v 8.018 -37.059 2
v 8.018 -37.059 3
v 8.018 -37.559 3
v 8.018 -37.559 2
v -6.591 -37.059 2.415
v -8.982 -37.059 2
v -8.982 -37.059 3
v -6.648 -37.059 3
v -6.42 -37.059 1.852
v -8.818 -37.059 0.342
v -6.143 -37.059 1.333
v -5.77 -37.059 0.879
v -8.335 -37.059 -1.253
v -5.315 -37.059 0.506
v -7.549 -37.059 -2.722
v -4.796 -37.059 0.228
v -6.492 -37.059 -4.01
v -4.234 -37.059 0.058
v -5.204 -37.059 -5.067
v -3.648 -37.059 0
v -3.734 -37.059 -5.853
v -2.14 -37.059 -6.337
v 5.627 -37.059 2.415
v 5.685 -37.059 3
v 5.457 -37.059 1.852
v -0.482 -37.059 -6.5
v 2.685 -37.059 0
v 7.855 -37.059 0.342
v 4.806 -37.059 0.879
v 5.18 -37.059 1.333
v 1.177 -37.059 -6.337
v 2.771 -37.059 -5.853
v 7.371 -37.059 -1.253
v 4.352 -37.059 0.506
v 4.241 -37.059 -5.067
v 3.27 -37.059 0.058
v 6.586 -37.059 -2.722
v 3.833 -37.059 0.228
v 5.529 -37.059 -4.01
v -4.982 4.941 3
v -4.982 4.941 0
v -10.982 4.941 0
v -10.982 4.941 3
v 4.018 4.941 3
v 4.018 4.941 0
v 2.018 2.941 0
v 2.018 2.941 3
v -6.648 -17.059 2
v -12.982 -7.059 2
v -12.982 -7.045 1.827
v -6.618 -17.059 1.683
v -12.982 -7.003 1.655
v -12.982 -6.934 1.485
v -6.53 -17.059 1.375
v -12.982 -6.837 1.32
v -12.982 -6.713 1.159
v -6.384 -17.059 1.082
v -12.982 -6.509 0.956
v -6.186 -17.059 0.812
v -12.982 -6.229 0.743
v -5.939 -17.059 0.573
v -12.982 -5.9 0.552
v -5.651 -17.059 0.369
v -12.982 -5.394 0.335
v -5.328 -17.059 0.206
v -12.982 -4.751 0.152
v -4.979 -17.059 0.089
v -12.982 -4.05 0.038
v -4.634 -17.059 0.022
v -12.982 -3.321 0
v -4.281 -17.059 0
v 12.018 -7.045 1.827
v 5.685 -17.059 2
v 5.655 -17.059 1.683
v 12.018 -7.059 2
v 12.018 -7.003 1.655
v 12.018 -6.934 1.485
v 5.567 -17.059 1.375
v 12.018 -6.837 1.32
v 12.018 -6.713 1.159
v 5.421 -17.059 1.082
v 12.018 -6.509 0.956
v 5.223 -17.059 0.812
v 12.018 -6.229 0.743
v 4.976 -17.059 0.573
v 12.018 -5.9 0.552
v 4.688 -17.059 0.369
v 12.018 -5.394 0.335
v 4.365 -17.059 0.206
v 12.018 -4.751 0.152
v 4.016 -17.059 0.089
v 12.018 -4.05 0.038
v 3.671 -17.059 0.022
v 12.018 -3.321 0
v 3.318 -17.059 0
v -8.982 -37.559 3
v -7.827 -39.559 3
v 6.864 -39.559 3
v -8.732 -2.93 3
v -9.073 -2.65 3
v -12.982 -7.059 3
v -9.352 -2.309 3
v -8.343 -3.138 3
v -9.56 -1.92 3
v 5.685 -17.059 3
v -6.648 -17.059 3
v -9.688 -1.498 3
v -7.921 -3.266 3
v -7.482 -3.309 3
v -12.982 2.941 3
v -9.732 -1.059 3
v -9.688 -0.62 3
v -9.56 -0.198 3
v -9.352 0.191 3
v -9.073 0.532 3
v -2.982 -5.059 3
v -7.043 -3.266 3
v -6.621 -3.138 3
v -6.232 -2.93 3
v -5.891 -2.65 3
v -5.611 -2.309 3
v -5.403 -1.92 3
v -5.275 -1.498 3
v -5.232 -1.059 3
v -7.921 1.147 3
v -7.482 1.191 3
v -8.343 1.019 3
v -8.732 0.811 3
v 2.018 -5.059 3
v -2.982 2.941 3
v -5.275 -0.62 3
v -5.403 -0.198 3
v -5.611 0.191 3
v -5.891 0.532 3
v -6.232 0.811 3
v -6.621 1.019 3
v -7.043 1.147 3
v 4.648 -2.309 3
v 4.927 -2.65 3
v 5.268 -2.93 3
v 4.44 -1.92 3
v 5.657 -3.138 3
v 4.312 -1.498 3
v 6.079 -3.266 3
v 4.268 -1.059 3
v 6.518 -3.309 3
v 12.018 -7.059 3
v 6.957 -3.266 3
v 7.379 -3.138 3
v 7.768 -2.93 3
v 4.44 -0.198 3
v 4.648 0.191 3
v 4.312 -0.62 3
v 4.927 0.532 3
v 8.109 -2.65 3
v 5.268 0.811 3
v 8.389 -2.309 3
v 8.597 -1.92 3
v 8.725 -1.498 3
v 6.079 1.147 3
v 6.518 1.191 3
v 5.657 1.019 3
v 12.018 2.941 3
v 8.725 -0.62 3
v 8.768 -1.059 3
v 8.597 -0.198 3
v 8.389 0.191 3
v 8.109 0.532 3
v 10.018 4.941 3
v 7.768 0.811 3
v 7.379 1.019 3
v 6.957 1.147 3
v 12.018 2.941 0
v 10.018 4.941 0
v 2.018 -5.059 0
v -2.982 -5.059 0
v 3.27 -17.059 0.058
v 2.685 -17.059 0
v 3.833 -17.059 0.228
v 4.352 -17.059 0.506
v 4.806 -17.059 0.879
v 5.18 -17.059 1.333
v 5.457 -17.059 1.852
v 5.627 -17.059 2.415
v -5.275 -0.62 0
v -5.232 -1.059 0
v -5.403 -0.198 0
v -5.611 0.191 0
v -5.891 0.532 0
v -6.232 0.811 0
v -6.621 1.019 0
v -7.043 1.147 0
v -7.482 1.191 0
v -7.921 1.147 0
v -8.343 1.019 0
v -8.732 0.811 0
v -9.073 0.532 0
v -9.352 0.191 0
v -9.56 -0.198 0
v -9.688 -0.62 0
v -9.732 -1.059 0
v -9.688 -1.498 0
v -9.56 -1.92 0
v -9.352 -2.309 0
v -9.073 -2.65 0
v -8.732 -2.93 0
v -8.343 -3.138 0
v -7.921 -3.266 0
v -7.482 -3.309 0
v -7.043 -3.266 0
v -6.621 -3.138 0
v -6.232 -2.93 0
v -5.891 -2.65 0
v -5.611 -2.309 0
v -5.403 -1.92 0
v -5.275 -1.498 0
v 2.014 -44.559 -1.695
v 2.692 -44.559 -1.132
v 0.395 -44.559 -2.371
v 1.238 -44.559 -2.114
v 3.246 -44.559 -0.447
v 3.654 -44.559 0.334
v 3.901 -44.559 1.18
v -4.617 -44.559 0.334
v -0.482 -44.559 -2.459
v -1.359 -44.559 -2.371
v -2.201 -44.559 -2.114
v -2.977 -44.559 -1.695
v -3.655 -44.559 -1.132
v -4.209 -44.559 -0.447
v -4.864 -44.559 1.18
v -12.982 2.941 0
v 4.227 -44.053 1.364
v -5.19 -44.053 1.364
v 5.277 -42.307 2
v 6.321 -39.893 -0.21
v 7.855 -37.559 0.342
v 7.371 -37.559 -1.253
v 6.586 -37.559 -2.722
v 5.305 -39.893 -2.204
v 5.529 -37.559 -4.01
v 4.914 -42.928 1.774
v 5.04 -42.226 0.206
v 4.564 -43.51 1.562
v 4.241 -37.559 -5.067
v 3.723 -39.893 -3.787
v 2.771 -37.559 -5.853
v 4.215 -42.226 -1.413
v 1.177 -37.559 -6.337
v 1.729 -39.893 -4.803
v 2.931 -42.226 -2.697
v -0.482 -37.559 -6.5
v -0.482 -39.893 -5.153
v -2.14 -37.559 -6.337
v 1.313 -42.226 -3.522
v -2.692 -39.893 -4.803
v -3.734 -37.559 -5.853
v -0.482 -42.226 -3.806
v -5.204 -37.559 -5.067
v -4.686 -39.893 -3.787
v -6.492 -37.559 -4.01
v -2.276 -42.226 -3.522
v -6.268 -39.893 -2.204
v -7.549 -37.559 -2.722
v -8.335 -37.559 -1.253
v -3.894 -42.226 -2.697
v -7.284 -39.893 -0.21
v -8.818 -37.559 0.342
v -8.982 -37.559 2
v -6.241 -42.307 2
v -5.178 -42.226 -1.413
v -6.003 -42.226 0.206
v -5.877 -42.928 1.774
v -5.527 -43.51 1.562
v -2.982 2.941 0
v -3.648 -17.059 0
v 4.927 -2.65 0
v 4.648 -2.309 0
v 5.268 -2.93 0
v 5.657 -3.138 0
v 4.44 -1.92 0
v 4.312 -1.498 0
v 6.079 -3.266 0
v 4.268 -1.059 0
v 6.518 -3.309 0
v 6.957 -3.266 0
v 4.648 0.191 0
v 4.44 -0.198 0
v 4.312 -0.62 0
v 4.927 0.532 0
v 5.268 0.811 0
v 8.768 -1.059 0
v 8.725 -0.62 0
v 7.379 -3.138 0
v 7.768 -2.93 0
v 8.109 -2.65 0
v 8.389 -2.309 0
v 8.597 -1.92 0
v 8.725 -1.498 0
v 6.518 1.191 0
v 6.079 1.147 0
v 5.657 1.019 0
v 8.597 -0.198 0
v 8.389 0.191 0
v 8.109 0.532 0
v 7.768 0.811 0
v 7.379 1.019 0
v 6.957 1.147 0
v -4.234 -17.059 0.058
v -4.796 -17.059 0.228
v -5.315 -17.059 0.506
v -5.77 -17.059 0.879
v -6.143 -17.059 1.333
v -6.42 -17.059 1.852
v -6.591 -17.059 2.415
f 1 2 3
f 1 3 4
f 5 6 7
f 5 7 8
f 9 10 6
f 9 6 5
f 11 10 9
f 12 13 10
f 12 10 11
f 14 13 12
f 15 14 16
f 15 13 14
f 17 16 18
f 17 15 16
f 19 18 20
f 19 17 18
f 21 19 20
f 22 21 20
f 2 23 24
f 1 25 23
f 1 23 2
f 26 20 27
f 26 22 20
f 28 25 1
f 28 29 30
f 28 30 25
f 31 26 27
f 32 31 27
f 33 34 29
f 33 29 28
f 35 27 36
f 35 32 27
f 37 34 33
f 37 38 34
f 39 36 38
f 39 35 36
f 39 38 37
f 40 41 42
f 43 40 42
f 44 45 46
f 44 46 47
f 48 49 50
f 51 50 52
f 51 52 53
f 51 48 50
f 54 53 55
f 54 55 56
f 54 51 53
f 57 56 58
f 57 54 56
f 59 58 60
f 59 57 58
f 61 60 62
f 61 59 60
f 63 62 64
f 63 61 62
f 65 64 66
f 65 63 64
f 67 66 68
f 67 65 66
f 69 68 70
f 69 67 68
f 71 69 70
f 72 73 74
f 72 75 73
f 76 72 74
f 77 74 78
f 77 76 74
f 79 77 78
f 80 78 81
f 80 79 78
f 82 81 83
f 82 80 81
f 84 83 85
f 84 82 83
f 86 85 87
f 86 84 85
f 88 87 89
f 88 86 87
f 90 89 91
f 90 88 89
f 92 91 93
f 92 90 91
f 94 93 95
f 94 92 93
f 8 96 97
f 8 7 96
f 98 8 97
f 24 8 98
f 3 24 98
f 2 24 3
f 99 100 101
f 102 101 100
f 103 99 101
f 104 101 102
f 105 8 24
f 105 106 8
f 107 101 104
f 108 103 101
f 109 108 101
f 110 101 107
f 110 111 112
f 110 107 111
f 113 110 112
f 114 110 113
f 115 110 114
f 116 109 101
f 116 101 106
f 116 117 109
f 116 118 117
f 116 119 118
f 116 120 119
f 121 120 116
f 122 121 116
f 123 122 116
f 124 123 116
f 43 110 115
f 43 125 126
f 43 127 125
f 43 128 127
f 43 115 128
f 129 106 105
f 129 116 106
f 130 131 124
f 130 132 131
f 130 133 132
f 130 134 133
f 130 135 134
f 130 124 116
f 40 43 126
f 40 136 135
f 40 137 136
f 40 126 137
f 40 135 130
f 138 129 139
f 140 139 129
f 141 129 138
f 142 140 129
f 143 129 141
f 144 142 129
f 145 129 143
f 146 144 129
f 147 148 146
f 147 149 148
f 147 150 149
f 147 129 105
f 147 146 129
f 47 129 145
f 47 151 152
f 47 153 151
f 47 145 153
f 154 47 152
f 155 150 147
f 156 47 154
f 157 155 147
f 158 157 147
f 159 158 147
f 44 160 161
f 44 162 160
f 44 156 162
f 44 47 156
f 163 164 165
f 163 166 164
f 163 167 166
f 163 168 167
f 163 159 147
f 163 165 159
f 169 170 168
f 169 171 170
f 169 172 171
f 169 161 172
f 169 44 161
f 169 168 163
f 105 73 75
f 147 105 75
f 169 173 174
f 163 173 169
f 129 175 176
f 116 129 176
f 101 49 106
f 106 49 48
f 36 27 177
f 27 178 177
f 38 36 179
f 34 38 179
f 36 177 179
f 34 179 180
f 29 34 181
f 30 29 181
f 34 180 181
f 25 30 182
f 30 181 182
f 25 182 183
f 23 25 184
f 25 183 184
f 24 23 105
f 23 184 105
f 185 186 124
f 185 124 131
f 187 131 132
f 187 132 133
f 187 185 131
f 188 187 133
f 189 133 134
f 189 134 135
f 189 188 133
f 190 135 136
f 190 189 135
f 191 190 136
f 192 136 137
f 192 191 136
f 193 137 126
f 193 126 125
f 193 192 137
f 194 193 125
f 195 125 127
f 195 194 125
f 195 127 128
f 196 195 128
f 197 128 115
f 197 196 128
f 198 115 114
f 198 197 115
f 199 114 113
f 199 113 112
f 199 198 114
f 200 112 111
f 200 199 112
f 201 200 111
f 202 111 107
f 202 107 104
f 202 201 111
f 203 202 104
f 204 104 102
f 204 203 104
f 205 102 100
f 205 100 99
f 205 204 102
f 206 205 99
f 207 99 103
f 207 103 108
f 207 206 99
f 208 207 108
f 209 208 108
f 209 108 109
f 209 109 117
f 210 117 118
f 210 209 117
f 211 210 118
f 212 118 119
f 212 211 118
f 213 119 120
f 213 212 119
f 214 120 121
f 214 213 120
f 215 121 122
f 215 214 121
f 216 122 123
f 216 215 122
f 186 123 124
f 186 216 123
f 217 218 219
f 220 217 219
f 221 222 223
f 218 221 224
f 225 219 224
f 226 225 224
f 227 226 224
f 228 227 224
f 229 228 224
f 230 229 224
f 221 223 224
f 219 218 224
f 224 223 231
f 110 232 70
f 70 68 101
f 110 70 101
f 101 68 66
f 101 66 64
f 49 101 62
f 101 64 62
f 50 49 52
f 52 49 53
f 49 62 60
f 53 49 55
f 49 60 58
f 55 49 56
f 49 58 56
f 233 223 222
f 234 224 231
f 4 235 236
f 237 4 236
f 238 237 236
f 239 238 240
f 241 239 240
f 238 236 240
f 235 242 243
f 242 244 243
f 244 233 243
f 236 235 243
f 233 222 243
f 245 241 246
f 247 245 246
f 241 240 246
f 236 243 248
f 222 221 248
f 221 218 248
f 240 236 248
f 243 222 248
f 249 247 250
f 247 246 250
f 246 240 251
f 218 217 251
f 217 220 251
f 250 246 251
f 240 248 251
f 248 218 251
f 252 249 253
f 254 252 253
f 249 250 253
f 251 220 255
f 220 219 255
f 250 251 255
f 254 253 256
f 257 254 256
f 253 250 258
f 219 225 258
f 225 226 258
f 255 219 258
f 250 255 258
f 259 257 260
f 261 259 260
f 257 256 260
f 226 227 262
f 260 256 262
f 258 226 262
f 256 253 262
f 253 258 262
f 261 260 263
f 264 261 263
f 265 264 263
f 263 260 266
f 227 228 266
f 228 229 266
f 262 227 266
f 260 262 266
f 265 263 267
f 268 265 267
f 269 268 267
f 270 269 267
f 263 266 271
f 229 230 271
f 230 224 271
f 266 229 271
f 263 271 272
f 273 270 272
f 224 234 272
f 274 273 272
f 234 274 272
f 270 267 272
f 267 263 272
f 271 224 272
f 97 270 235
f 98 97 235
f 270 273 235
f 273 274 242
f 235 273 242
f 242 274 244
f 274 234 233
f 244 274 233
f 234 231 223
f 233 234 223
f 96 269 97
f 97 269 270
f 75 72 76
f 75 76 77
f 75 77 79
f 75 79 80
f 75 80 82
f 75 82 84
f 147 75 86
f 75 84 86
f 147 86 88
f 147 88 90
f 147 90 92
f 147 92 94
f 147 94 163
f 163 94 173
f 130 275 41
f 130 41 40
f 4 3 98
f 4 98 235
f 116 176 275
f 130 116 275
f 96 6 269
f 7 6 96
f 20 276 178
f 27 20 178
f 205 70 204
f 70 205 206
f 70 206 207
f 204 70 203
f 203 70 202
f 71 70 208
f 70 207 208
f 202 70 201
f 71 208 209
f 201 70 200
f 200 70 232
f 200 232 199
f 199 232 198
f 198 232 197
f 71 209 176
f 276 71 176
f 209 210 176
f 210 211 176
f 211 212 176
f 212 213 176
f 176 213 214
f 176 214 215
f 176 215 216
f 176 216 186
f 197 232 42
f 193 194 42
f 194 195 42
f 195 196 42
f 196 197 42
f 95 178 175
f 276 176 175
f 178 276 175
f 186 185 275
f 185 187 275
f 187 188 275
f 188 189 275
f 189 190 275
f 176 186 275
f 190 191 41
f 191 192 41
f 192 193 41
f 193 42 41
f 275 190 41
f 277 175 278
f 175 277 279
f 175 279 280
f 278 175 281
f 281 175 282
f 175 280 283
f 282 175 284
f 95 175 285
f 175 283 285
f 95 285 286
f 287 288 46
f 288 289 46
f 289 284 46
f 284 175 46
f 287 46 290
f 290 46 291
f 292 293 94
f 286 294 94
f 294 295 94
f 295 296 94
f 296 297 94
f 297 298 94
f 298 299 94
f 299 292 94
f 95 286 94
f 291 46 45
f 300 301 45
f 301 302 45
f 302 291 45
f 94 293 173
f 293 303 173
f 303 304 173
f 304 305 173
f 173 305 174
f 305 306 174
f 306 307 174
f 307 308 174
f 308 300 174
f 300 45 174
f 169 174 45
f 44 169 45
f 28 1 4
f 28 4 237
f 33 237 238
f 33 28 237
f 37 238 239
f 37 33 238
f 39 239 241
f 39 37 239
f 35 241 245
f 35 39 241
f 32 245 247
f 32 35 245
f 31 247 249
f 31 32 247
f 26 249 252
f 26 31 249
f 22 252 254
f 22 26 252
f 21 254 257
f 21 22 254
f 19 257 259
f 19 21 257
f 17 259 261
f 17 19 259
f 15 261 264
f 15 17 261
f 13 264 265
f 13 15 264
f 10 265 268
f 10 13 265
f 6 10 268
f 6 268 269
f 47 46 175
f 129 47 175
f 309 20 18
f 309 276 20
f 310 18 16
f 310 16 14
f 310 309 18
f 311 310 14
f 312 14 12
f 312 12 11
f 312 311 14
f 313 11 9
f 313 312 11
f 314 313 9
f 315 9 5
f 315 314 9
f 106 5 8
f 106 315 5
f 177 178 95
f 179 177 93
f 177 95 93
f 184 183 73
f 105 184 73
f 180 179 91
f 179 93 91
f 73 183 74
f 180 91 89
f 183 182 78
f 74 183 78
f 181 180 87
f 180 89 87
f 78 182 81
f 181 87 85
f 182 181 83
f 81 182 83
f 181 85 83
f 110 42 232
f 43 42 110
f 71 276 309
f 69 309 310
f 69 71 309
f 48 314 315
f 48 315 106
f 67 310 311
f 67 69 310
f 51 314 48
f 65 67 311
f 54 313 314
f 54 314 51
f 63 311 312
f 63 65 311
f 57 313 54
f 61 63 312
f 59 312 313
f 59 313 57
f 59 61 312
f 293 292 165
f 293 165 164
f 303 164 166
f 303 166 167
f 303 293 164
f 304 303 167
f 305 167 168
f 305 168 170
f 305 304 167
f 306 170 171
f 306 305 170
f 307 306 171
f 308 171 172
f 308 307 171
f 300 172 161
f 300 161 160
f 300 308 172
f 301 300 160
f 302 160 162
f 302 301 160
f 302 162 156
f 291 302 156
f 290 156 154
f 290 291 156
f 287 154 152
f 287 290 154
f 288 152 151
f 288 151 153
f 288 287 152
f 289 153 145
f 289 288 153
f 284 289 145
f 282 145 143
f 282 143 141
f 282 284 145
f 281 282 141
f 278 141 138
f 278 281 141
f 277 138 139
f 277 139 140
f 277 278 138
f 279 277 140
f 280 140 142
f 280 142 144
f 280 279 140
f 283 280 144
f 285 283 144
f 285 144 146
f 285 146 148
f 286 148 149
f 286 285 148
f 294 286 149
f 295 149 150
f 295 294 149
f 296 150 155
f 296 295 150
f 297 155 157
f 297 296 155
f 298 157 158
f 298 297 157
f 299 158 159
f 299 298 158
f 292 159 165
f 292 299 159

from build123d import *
from OCP.BRepFilletAPI import BRepFilletAPI_MakeChamfer

# Parameters (mm, degrees)
SKETCH1_R           = 2.25
BOSS_EXTRUDE1_DEPTH = 3
BOSS_EXTRUDE2_DEPTH = 3
BOSS_EXTRUDE3_DEPTH = 7.5
CHAMFER1_SIZE       = 7
CHAMFER1_SIZE2      = 4.041451884
CUT_EXTRUDE1_DEPTH  = 47.864827652
FILLET1_R           = 3
CHAMFER2_SIZE       = 2
CHAMFER2_SIZE2      = 2.328114762
CHAMFER3_SIZE       = 5
CHAMFER3_SIZE2      = 1.819851171
CUT_EXTRUDE2_DEPTH  = 47.864827652
FILLET2_R           = 2


with BuildPart() as part:
    # Sketch1 → Boss-Extrude1 (new body)
    with BuildSketch(Plane.XY):
        Polygon((2.018448149, -5.059414071), (-2.981551851, -5.059414071), (-2.981551851, 4.940585929), (-12.981551851, 4.940585929), (-12.981551851, -7.059414071), (12.018448149, -7.059414071), (12.018448149, 4.940585929), (2.018448149, 4.940585929), align=None)
        with Locations((6.518448149, -1.059414071)):
            Circle(SKETCH1_R, mode=Mode.SUBTRACT)
        with Locations((-7.481551851, -1.059414071)):
            Circle(SKETCH1_R, mode=Mode.SUBTRACT)
    extrude(amount=BOSS_EXTRUDE1_DEPTH)

    # Sketch2 → Boss-Extrude2 (add, through all)
    with BuildSketch(Plane.XY.offset(3)):
        Polygon((-12.981551851, -7.059414071), (-8.981551851, -37.059414071), (8.018448149, -37.059414071), (12.018448149, -7.059414071), align=None)
    extrude(amount=-BOSS_EXTRUDE2_DEPTH)

    # Sketch4 → Boss-Extrude3 (add)
    with BuildSketch(Plane.XZ.offset(37.059414071)):
        with BuildLine():
            Line((-8.981551851, 2), (-8.981551851, 3))
            Line((-8.981551851, 3), (8.018448149, 3))
            Line((8.018448149, 3), (8.018448149, 2))
            ThreePointArc((8.018448149, 2), (-0.481551851, -6.5), (-8.981551851, 2))
        make_face()
    extrude(amount=BOSS_EXTRUDE3_DEPTH)

    # Chamfer1: one chamfer whose edges measure the first distance from different faces: ONE call of the kernel's chamfer builder (chamfer() names one face for all edges)
    chamfer1_edges_1 = [part.edges().sort_by_distance(p)[0] for p in [
        (-0.481551851, -44.559414071, -6.5),
    ]]
    chamfer1_side_1 = [part.faces().sort_by_distance(p)[0] for p in [
        (-0.481551851, -40.809414071, -6.5),
    ]]
    chamfer1_edges_2 = [part.edges().sort_by_distance(p)[0] for p in [
        (8.018448149, -44.559414071, 2.5),
    ]]
    chamfer1_side_2 = [part.faces().sort_by_distance(p)[0] for p in [
        (8.018448149, -40.809414071, 2.5),
    ]]
    chamfer1_edges_3 = [part.edges().sort_by_distance(p)[0] for p in [
        (-8.981551851, -44.559414071, 2.5),
    ]]
    chamfer1_side_3 = [part.faces().sort_by_distance(p)[0] for p in [
        (-8.981551851, -40.809414071, 2.5),
    ]]
    chamfer1 = BRepFilletAPI_MakeChamfer(part.part.solid().wrapped)
    for e in chamfer1_edges_1:
        chamfer1.Add(CHAMFER1_SIZE, CHAMFER1_SIZE2, e.wrapped, chamfer1_side_1[0].wrapped)  # the first distance lies on this face
    for e in chamfer1_edges_2:
        chamfer1.Add(CHAMFER1_SIZE, CHAMFER1_SIZE2, e.wrapped, chamfer1_side_2[0].wrapped)  # the first distance lies on this face
    for e in chamfer1_edges_3:
        chamfer1.Add(CHAMFER1_SIZE, CHAMFER1_SIZE2, e.wrapped, chamfer1_side_3[0].wrapped)  # the first distance lies on this face
    add(Compound.cast(chamfer1.Shape()), mode=Mode.REPLACE)

    # Sketch5 → Cut-Extrude1 (cut, through all)
    with BuildSketch(Plane(origin=(0, 0, 0), x_dir=(-1, 0, 0), z_dir=(0, 0, -1))):
        Polygon((6.648218517, -37.059414071), (6.648218517, -17.059414071), (11.648218517, -17.059414071), (8.981551851, -37.059414071), align=None)
        Polygon((-10.685114816, -17.059414071), (-8.018448149, -37.059414071), (-5.685114816, -37.059414071), (-5.685114816, -17.059414071), align=None)
    extrude(amount=-CUT_EXTRUDE1_DEPTH, mode=Mode.SUBTRACT)

    # Fillet1
    fillet1_edges = [part.edges().sort_by_distance(p)[0] for p in [
        (5.685114816, -27.059414071, 0),
        (-6.648218517, -27.059414071, 0),
    ]]
    fillet(fillet1_edges, radius=FILLET1_R - 0.0001)  # a hair under: the kernel refuses the full size

    # Chamfer2: one chamfer whose edges measure the first distance from different faces: ONE call of the kernel's chamfer builder (chamfer() names one face for all edges)
    chamfer2_edges_1 = [part.edges().sort_by_distance(p)[0] for p in [
        (2.018448149, 4.940585929, 1.5),
        (12.018448149, 4.940585929, 1.5),
        (-12.981551851, 4.940585929, 1.5),
        (-2.981551851, 4.940585929, 1.5),
    ]]
    chamfer2_edges_2 = [part.edges().sort_by_distance(p)[0] for p in [
        (-11.648218517, -17.059414071, 1.5),
    ]]
    chamfer2_side_2 = [part.faces().sort_by_distance(p)[0] for p in [
        (-12.314885184, -12.059414071, 1.5),
    ]]
    chamfer2_edges_3 = [part.edges().sort_by_distance(p)[0] for p in [
        (10.685114816, -17.059414071, 1.5),
    ]]
    chamfer2_side_3 = [part.faces().sort_by_distance(p)[0] for p in [
        (7.823515647, -17.059414071, 1.405334343),
    ]]
    chamfer2 = BRepFilletAPI_MakeChamfer(part.part.solid().wrapped)
    for e in chamfer2_edges_1:
        chamfer2.Add(CHAMFER2_SIZE, e.wrapped)
    for e in chamfer2_edges_2:
        chamfer2.Add(CHAMFER2_SIZE, CHAMFER2_SIZE2, e.wrapped, chamfer2_side_2[0].wrapped)  # the first distance lies on this face
    for e in chamfer2_edges_3:
        chamfer2.Add(CHAMFER2_SIZE, CHAMFER2_SIZE2, e.wrapped, chamfer2_side_3[0].wrapped)  # the first distance lies on this face
    add(Compound.cast(chamfer2.Shape()), mode=Mode.REPLACE)

    # Chamfer3
    chamfer3_edges = [part.edges().sort_by_distance(p)[0] for p in [
        (-0.481551851, -44.559414071, 3),
    ]]
    chamfer3_side = [part.faces().sort_by_distance(p)[0] for p in [
        (-0.481914427, -17.452973587, 3),
    ]]
    chamfer(chamfer3_edges, length=CHAMFER3_SIZE, length2=CHAMFER3_SIZE2, reference=chamfer3_side[0])

    # Sketch6 → Cut-Extrude2 (cut, through all)
    with BuildSketch(Plane(origin=(0, 0, 0), x_dir=(-1, 0, 0), z_dir=(0, 0, -1))):
        Polygon((-5.685114816, -17.059414071), (-12.018448149, -7.059414071), (-10.992807124, -14.751721764), (-8.685114816, -17.059414071), align=None)
        Polygon((12.981551851, -7.059414071), (6.648218517, -17.059414071), (9.320103756, -17.059414071), (11.912545957, -15.07695827), align=None)
    extrude(amount=-CUT_EXTRUDE2_DEPTH, mode=Mode.SUBTRACT)

    # Fillet2
    fillet2_edges = [part.edges().sort_by_distance(p)[0] for p in [
        (8.851781483, -12.059414071, 0),
        (-9.814885184, -12.059414071, 0),
    ]]
    fillet(fillet2_edges, radius=FILLET2_R)


solid = part.part
